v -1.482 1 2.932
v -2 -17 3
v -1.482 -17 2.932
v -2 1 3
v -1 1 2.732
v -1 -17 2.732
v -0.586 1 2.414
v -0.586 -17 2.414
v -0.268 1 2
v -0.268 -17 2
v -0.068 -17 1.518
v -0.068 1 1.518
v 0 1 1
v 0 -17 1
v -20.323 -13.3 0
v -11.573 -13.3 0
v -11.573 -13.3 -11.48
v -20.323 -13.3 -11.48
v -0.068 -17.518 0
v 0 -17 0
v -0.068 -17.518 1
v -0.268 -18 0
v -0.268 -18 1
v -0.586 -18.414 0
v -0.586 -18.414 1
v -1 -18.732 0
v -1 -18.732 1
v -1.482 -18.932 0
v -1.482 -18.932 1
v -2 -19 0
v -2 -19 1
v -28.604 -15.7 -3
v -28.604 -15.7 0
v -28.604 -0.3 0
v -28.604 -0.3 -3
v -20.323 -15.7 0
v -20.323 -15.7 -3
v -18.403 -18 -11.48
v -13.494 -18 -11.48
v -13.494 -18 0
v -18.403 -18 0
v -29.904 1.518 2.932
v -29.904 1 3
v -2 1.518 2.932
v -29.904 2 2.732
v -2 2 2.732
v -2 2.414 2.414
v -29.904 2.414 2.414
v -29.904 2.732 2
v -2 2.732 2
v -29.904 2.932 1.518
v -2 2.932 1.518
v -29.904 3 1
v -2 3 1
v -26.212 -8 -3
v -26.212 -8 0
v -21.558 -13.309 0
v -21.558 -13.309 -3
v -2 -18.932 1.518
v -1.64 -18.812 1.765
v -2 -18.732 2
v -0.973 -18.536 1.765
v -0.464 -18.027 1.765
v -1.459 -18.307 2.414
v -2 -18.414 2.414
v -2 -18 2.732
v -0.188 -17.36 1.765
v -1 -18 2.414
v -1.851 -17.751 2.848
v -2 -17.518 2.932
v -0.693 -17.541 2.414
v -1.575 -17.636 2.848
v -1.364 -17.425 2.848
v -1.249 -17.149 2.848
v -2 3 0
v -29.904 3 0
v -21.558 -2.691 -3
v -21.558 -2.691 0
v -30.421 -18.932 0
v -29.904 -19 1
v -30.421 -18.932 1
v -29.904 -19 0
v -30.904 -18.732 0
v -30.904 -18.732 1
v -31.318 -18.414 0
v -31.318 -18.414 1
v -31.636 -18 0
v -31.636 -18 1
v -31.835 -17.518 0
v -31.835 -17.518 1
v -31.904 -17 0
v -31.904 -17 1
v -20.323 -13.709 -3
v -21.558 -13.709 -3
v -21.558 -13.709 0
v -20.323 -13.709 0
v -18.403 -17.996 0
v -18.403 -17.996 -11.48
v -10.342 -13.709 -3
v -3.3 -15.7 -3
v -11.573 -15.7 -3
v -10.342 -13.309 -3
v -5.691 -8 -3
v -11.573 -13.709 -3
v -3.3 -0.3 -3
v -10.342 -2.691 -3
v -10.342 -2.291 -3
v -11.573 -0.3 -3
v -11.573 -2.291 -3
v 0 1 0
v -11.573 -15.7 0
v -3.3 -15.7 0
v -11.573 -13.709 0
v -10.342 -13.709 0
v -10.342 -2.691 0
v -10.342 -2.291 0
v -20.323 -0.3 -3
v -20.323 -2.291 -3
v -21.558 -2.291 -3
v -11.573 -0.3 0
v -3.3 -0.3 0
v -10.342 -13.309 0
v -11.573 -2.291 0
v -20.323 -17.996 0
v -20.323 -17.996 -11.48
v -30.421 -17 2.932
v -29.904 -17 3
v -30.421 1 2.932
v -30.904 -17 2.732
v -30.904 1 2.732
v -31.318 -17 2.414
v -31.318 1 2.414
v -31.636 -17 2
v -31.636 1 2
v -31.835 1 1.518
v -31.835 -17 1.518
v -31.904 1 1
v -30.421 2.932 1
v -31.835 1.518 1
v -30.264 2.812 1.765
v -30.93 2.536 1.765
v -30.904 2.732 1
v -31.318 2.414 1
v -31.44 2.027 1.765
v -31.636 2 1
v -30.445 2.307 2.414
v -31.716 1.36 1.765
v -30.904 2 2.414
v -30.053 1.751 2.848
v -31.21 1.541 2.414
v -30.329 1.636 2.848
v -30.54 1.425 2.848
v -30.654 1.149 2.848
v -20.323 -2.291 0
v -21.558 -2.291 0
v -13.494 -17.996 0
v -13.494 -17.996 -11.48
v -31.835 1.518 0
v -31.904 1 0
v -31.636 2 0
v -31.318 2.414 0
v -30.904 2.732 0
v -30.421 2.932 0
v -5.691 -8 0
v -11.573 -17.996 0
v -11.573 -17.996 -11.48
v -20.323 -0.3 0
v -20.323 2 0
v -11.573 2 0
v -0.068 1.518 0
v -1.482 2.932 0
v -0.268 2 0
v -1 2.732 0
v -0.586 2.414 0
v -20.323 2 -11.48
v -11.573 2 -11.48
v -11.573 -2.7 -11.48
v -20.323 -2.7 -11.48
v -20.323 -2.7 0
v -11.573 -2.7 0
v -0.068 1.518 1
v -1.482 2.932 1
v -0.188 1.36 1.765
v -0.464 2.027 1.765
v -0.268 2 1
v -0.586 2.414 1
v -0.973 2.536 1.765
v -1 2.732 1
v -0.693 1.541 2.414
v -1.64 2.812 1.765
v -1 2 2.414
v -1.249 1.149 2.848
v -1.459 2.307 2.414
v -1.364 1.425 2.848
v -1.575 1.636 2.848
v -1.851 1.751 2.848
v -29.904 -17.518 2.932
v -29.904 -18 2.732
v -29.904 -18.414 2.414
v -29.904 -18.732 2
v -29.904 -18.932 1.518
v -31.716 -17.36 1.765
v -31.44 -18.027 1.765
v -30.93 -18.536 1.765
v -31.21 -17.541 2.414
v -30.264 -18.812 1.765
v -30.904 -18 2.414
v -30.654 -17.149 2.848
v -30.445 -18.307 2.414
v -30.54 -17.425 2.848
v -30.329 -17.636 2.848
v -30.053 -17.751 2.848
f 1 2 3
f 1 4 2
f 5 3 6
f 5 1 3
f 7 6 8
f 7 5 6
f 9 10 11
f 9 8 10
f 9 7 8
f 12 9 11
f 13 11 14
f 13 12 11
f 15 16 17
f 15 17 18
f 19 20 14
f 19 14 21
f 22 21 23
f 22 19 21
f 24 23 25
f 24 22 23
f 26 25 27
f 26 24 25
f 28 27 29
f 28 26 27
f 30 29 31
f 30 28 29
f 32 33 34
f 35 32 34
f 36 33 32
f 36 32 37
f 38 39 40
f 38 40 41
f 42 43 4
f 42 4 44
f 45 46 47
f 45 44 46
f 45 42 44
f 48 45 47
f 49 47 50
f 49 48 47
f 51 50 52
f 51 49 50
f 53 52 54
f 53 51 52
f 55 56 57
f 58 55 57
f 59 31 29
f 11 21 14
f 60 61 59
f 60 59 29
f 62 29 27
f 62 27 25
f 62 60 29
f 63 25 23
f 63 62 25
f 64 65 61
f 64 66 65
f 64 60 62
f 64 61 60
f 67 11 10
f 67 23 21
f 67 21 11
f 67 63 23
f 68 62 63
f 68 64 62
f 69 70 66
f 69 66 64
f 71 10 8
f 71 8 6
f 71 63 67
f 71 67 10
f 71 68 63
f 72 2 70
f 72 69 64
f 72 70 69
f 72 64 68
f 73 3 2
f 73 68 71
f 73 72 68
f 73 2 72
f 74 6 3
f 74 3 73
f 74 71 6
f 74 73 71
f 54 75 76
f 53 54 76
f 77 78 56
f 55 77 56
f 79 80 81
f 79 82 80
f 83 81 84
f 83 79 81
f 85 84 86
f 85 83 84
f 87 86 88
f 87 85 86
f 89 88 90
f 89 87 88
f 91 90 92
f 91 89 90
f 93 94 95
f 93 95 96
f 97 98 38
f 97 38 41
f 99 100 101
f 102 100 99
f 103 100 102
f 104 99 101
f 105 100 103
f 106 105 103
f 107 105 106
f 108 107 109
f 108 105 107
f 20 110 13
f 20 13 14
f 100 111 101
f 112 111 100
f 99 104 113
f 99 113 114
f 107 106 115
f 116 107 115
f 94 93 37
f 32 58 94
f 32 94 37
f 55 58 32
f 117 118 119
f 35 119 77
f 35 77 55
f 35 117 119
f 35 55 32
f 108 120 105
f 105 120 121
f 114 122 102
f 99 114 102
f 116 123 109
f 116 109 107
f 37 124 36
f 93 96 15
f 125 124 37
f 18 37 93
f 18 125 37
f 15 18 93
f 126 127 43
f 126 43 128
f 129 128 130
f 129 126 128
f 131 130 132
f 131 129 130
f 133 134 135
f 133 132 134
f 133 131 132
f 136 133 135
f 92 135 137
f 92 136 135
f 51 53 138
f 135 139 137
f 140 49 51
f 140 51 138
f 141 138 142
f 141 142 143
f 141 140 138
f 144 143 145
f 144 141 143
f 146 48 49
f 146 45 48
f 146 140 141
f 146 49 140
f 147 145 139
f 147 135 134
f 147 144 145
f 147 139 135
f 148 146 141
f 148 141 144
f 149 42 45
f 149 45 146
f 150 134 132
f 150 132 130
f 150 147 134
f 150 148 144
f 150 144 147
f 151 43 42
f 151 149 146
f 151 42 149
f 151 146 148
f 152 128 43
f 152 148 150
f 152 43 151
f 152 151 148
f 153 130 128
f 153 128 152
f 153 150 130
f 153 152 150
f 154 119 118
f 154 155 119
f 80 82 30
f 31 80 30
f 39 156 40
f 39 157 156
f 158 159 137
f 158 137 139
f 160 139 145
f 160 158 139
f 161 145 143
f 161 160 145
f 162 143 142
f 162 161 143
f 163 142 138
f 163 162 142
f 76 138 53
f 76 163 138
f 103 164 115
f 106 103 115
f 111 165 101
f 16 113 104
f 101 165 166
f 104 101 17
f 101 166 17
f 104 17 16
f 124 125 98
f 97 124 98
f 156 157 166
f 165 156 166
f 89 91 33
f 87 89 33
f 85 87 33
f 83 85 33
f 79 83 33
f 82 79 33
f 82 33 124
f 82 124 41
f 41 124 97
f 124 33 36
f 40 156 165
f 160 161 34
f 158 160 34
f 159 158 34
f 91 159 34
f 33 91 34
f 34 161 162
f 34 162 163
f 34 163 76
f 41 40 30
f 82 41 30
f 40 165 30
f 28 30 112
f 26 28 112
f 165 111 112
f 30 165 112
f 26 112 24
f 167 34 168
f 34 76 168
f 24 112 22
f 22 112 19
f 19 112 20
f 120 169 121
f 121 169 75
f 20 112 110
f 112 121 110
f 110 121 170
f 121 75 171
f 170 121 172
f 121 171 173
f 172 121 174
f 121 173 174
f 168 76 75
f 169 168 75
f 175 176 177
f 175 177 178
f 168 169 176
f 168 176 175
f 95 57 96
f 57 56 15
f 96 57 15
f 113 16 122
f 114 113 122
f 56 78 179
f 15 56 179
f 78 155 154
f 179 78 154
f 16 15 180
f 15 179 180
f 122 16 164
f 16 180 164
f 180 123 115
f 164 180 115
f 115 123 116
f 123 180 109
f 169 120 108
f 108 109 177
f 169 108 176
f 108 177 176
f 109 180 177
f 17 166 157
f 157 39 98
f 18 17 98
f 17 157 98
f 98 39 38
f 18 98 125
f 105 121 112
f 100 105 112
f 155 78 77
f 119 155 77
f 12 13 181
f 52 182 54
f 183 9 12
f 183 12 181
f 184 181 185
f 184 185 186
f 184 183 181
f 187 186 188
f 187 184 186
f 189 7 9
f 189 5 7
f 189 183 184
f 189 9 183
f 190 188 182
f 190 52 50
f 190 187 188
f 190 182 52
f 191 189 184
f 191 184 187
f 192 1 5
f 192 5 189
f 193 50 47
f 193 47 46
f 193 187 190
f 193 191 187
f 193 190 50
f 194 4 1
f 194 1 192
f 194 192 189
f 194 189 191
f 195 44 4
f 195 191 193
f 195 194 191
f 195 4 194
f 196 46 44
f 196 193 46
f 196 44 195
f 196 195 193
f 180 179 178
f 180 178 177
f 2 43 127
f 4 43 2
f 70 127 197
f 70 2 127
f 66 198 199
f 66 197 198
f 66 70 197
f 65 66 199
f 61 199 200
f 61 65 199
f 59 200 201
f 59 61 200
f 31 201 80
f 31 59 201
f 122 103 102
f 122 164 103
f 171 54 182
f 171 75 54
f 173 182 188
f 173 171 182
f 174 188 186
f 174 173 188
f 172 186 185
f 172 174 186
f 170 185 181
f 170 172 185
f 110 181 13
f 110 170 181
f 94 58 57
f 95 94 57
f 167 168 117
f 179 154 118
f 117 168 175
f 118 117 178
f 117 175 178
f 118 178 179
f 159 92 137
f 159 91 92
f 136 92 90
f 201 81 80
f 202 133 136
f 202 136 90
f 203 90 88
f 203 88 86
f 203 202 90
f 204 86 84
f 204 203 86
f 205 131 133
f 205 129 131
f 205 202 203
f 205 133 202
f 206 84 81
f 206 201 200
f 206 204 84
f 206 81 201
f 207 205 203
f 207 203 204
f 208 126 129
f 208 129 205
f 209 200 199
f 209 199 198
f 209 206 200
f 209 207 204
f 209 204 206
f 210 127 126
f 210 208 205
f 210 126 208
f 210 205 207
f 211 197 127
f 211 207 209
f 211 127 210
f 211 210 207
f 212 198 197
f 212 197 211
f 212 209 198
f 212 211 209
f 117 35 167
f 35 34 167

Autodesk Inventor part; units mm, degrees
ref_plane "YZ Plane" through (0, 0, 0) normal (1, 0, 0) x (0, 1, 0)
ref_plane "XZ Plane" through (0, 0, 0) normal (0, 1, 0) x (-1, 0, 0)
sketch "Sketch1" plane through (0, 0, 0) normal (0, 0, 1) x (1, 0, 0)
  arc A0 (-31.9035, -17) -> (-29.9035, -19) centre (-29.9035, -17) ccw projected
  line L0 (-29.9035, -19) -> (-2, -19) projected
  arc A1 (-2, -19) -> (0, -17) centre (-2, -17) ccw projected
  line L1 (0, 1) -> (0, -17) projected
  arc A2 (0, 1) -> (-2, 3) centre (-2, 1) ccw projected
  line L2 (-2, 3) -> (-29.9035, 3) projected
  arc A3 (-29.9035, 3) -> (-31.9035, 1) centre (-29.9035, 1) ccw projected
  line L3 (-31.9035, -17) -> (-31.9035, 1) projected
  line L4 (-17.2029, -18.3) -> (-17.2029, -16) projected
  line L5 (-28.9035, -16) -> (-17.2029, -16) projected
  line L6 (-28.9035, 0) -> (-28.9035, -16) projected
  line L7 (-17.2029, 0) -> (-28.9035, 0) projected
  line L8 (-17.2029, 0) -> (-17.2029, 2.3) projected
  line L9 (-17.2029, 2.3) -> (-14.6938, 2.3) projected
  line L10 (-14.6938, 2.3) -> (-14.6938, 0) projected
  line L11 (-3, 0) -> (-14.6938, 0) projected
  line L12 (-3, 0) -> (-3, -16) projected
  line L13 (-14.6938, -16) -> (-3, -16) projected
  line L14 (-14.6938, -16) -> (-14.6938, -18.3) projected
  line L15 (-17.2029, -18.3) -> (-14.6938, -18.3) projected
  line L16 (-14.6938, -16) -> (-17.2029, -16)
  line L17 (-14.6938, 0) -> (-17.2029, 0)
  line L18 (-16.9029, -16) -> (-14.9938, -16)
  line L19 (-14.9938, -16) -> (-14.9938, -18)
  line L20 (-14.9938, -18) -> (-16.9029, -18)
  line L21 (-16.9029, -18) -> (-16.9029, -16)
  line L22 (-16.9029, 2) -> (-14.9938, 2)
  line L23 (-14.9938, 2) -> (-14.9938, 0)
  line L24 (-14.9938, 0) -> (-16.9029, 0)
  line L25 (-16.9029, 0) -> (-16.9029, 2)
  point P0 (0, 0)
  dimension "d5" = 0.3
  dimension "d6" = 0
  dimension "d7" = 0.3
  dimension "d8" = 0.3
  dimension "d9" = 0.3
  dimension "d10" = 0.3
  dimension "d11" = 0.3
  dimension "d12" = 0
extrude "Extrusion1" add sketch "Sketch1" against normal blind 14.9 contours L16 L19 L20 L21 | L25 L22 L23 L17
ref_plane "Work Plane1" through (0, 0, 0) normal (0, 0, 1) x (1, 0, 0)
sketch "Sketch2" plane through (0, 0, 0) normal (0, 0, 1) x (1, 0, 0)
  arc A0 (-31.9035, -17) -> (-29.9035, -19) centre (-29.9035, -17) ccw projected
  line L0 (-29.9035, -19) -> (-2, -19) projected
  arc A1 (-2, -19) -> (0, -17) centre (-2, -17) ccw projected
  line L1 (0, 1) -> (0, -17) projected
  arc A2 (0, 1) -> (-2, 3) centre (-2, 1) ccw projected
  line L2 (-2, 3) -> (-29.9035, 3) projected
  arc A3 (-29.9035, 3) -> (-31.9035, 1) centre (-29.9035, 1) ccw projected
  line L3 (-31.9035, -17) -> (-31.9035, 1) projected
  line L4 (-17.2029, -18.3) -> (-17.2029, -16) projected
  line L5 (-28.9035, -16) -> (-17.2029, -16) projected
  line L6 (-28.9035, 0) -> (-28.9035, -16) projected
  line L7 (-17.2029, 0) -> (-28.9035, 0) projected
  line L8 (-17.2029, 0) -> (-17.2029, 2.3) projected
  line L9 (-17.2029, 2.3) -> (-14.6938, 2.3) projected
  line L10 (-14.6938, 2.3) -> (-14.6938, 0) projected
  line L11 (-3, 0) -> (-14.6938, 0) projected
  line L12 (-3, 0) -> (-3, -16) projected
  line L13 (-14.6938, -16) -> (-3, -16) projected
  line L14 (-14.6938, -16) -> (-14.6938, -18.3) projected
  line L15 (-17.2029, -18.3) -> (-14.6938, -18.3) projected
  line L16 (-17.2029, 0) -> (-14.6938, 0) projected
  line L17 (-14.6938, 0) -> (-14.6938, 2.3) projected
  line L18 (-14.6938, 2.3) -> (-17.2029, 2.3) projected
  line L19 (-17.2029, 2.3) -> (-17.2029, 0) projected
  line L20 (-17.2029, -18.3) -> (-14.6938, -18.3) projected
  line L21 (-14.6938, -18.3) -> (-14.6938, -16) projected
  line L22 (-14.6938, -16) -> (-17.2029, -16) projected
  line L23 (-17.2029, -16) -> (-17.2029, -18.3) projected
  point P0 (0, 0)
extrude "Extrusion2" add sketch "Sketch2" along normal blind 3 contours L3 A3 L2 A2 L1 A1 L0 A0 | L4 L22 L14 L15 | L5 L6 L7 L16 L11 L12 L13 L22 | L8 L9 L10 L16
fillet "Fillet1" radius 2 8 edges at (-31.3177, -18.4142, 3) (-31.9035, -8, 3) (-31.3177, 2.4142, 3) (-15.9518, 3, 3) (-0.5858, 2.4142, 3) (0, -8, 3) (-0.5858, -18.4142, 3) (-15.9518, -19, 3)
sketch "Sketch3" plane through (0, 0, 0) normal (0, 0, -1) x (-1, 0, 0)
  arc A0 (29.9035, -19) -> (31.9035, -17) centre (29.9035, -17) ccw projected
  line L0 (29.9035, -19) -> (2, -19) projected
  arc A1 (0, -17) -> (2, -19) centre (2, -17) ccw projected
  line L1 (0, 1) -> (0, -17) projected
  arc A2 (2, 3) -> (0, 1) centre (2, 1) ccw projected
  line L2 (2, 3) -> (29.9035, 3) projected
  arc A3 (31.9035, 1) -> (29.9035, 3) centre (29.9035, 1) ccw projected
  line L3 (31.9035, -17) -> (31.9035, 1) projected
  line L4 (17.2029, -18.3) -> (17.2029, -16) projected
  line L5 (28.9035, -16) -> (17.2029, -16) projected
  line L6 (28.9035, 0) -> (28.9035, -16) projected
  line L7 (17.2029, 0) -> (28.9035, 0) projected
  line L8 (17.2029, 0) -> (17.2029, 2.3) projected
  line L9 (17.2029, 2.3) -> (14.6938, 2.3) projected
  line L10 (14.6938, 2.3) -> (14.6938, 0) projected
  line L11 (3, 0) -> (14.6938, 0) projected
  line L12 (3, 0) -> (3, -16) projected
  line L13 (14.6938, -16) -> (3, -16) projected
  line L14 (14.6938, -16) -> (14.6938, -18.3) projected
  line L15 (17.2029, -18.3) -> (14.6938, -18.3) projected
  line L16 (14.9938, 0) -> (16.9029, 0) projected
  line L17 (14.9938, 0) -> (14.9938, -0.3)
  line L18 (14.9938, -0.3) -> (3.3, -0.3)
  line L19 (3.3, -0.3) -> (3.3, -1.8)
  line L20 (3.3, -1.8) -> (28.6035, -1.8)
  line L21 (28.6035, -0.3) -> (16.9029, -0.3)
  line L22 (16.9029, 0) -> (16.9029, -0.3)
  line L23 (28.6035, -1.8) -> (28.6035, -0.3)
  line L24 (3, -8) -> (28.9035, -8) construction
  line L25 (14.9938, -16) -> (16.9029, -16)
  line L26 (14.9938, -16) -> (14.9938, -15.7)
  line L27 (14.9938, -15.7) -> (3.3, -15.7)
  line L28 (3.3, -15.7) -> (3.3, -14.2)
  line L29 (3.3, -14.2) -> (28.6035, -14.2)
  line L30 (28.6035, -15.7) -> (16.9029, -15.7)
  line L31 (16.9029, -16) -> (16.9029, -15.7)
  line L32 (28.6035, -14.2) -> (28.6035, -15.7)
  line L33 (3.3, -1.8) -> (3.3, -14.2)
  line L34 (4.8, -14.2) -> (4.8, -1.8)
  line L35 (28.6035, -1.8) -> (28.6035, -14.2)
  line L36 (27.1035, -14.2) -> (27.1035, -1.8)
  point P0 (0, 0)
  dimension "d13" = 0.3
  dimension "d14" = 0.3
  dimension "d15" = 1.5
  dimension "d16" = 0.3
  dimension "d17" = 0.3
  dimension "d20" = 1.5
  dimension "d21" = 1.5
extrude "Extrusion3" add sketch "Sketch3" along normal blind 3 contours L16 L22 L21 L23 L20 L19 L18 L17 | L20 L34 L29 L33 | L35 L29 L36 L20 | L29 L32 L30 L31 L25 L26 L27 L28
sketch "Sketch4" plane through (-14.9938, -18, -14.9) normal (1, 0, 0) x (0, 0, -1)
  line L0 (-14.9, -0.3) -> (2.2893, -0.3) projected
  line L1 (-14.9, 2) -> (-14.9, -0.3) projected
  line L2 (2.2893, 2) -> (-14.9, 2) projected
  line L3 (2.2893, 2) -> (2.2893, -0.3) projected
  line L4 (0, 2) -> (0, 0) projected
  line L5 (-14.9, 0) -> (0, 0) projected
  line L6 (-14.9, 2.3) -> (-14.9, 0) projected
  line L7 (-14.9, 2.3) -> (-11.9, 2.3) projected
  line L8 (-11.9, 2.3) -> (-11.9, 2) projected
  line L9 (-11.9, 2) -> (0, 2) projected
  line L10 (0, 18) -> (0, 20) projected
  line L11 (-14.9, 20) -> (0, 20) projected
  line L12 (-14.9, 20) -> (-14.9, 17.7) projected
  line L13 (-14.9, 17.7) -> (-11.9, 17.7) projected
  line L14 (-11.9, 17.7) -> (-11.9, 18) projected
  line L15 (-11.9, 18) -> (0, 18) projected
  line L16 (-7.45, 2) -> (-11.9, 4.6913)
  line L17 (-11.9, 4.6913) -> (-11.9, 2.3)
  line L18 (-11.9, 10) -> (3.9744, 10) construction
  line L19 (-7.45, 18) -> (-11.9, 15.3087)
  line L20 (-11.9, 15.3087) -> (-11.9, 17.7)
  point P0 (-14.9, 18)
extrude "Extrusion4" add sketch "Sketch4" against normal up to surface (1.9092 mm away) contours L8 L17 L16 L2 | L19 L20 L14 L15
sketch "Sketch6" plane through (0, 0, 0) normal (0, 0, -1) x (-1, 0, 0)
  line L0 (27.1035, -1.8) -> (4.8, -1.8) projected
  line L1 (4.8, -1.8) -> (4.8, -14.2) projected
  line L2 (4.8, -14.2) -> (27.1035, -14.2) projected
  line L3 (27.1035, -14.2) -> (27.1035, -1.8) projected
  line L4 (14.9938, -13.3087) -> (16.9029, -13.3087) projected
  line L5 (14.9938, -2.6913) -> (16.9029, -2.6913) projected
  line L6 (14.9938, -2.6913) -> (5.6913, -2.6913)
  line L7 (5.6913, -2.6913) -> (5.6913, -13.3087)
  line L8 (5.6913, -13.3087) -> (14.9938, -13.3087)
  line L9 (16.9029, -13.3087) -> (26.2122, -13.3087)
  line L10 (26.2122, -13.3087) -> (26.2122, -2.6913)
  line L11 (26.2122, -2.6913) -> (16.9029, -2.6913)
  point P0 (0, 0)
  dimension "d24" = 0.8913
  dimension "d25" = 0.8913
  dimension "d26" = 0.8913
extrude "Extrusion5" add sketch "Sketch6" along normal up to surface (3 mm away)
sketch "Sketch7" plane through (0, 0, 0) normal (0, 0, -1) x (-1, 0, 0)
  line L0 (14.9938, -2.6913) -> (14.9938, -0.3) projected
  line L1 (3.3, -0.3) -> (14.9938, -0.3) projected
  line L2 (3.3, -15.7) -> (3.3, -0.3) projected
  line L3 (14.9938, -15.7) -> (3.3, -15.7) projected
  line L4 (14.9938, -13.3087) -> (14.9938, -15.7) projected
  line L5 (5.6913, -13.3087) -> (14.9938, -13.3087) projected
  line L6 (5.6913, -2.6913) -> (5.6913, -13.3087) projected
  line L7 (14.9938, -2.6913) -> (5.6913, -2.6913) projected
  line L8 (16.9029, -0.3) -> (16.9029, -2.6913) projected
  line L9 (26.2122, -2.6913) -> (16.9029, -2.6913) projected
  line L10 (26.2122, -13.3087) -> (26.2122, -2.6913) projected
  line L11 (16.9029, -13.3087) -> (26.2122, -13.3087) projected
  line L12 (16.9029, -13.3087) -> (16.9029, -15.7) projected
  line L13 (28.6035, -15.7) -> (16.9029, -15.7) projected
  line L14 (28.6035, -0.3) -> (28.6035, -15.7) projected
  line L15 (16.9029, -0.3) -> (28.6035, -0.3) projected
  line L16 (5.6913, -8) -> (10.3425, -13.3087)
  line L17 (5.6913, -8) -> (10.3425, -2.6913)
  line L18 (21.5576, -2.6913) -> (26.2122, -8)
  line L19 (26.2122, -8) -> (21.5576, -13.3087)
  point P0 (0, 0)
extrude "Extrusion6" add sketch "Sketch7" along normal up to surface (3 mm away) contours L17 L6 L7 | L16 L5 L6 | L9 L10 L18 | L10 L11 L19
sketch "Sketch8" plane through (0, 0, -14.9) normal (0, 0, -1) x (-1, 0, 0)
  line L0 (16.9029, 2) -> (16.9029, 0) projected
  line L1 (14.9938, 0) -> (14.9938, 2) projected
  line L2 (16.9029, 0) -> (14.9938, 0) projected
  line L3 (13.4938, 2) -> (18.4028, 2)
  line L4 (18.4028, 2) -> (18.4028, 0)
  line L5 (18.4028, 0) -> (13.4938, 0)
  line L6 (13.4938, 0) -> (13.4938, 2)
  line L7 (3.3, -15.7) -> (3.3, -0.3) projected
  line L8 (28.6035, -0.3) -> (28.6035, -15.7) projected
  line L9 (3.3, -8) -> (28.6035, -8) construction
  line L10 (13.4938, -18) -> (18.4028, -18)
  line L11 (18.4028, -18) -> (18.4028, -16)
  line L12 (18.4028, -16) -> (13.4938, -16)
  line L13 (13.4938, -16) -> (13.4938, -18)
  point P0 (0, 0)
  dimension "d31" = 4.909
  dimension "d32" = 1.9092
  dimension "d33" = 1.4999
  dimension "d34" = 0
  dimension "d35" = 2
  dimension "d36" = 2
extrude "Extrusion7" add sketch "Sketch8" against normal up to surface (14.9 mm away)
sketch "Sketch9" plane through (-14.9938, -16, 0) normal (1, 0, 0) x (0, 0, -1)
  line L0 (0, 0) -> (7.45, 0) projected
  line L1 (7.45, 0) -> (3, 2.6913) projected
  line L2 (3, 2.6913) -> (3, 0.3) projected
  line L3 (0, 0.3) -> (3, 0.3) projected
  line L4 (0, 0) -> (0, 0.3) projected
  line L5 (7.45, 16) -> (0, 16) projected
  line L6 (0, 16) -> (0, 15.7) projected
  line L7 (0, 15.7) -> (3, 15.7) projected
  line L8 (3, 13.3087) -> (3, 15.7) projected
  line L9 (3, 13.3087) -> (7.45, 16) projected
  point P0 (0, 16)
extrude "Extrusion8" add sketch "Sketch9" along normal up to surface (1.4999 mm away)
sketch "Sketch10" plane through (-16.9029, -16, 0) normal (-1, 0, 0) x (0, 0, 1)
  line L0 (-7.45, 0) -> (0, 0) projected
  line L1 (0, 0.3) -> (0, 0) projected
  line L2 (0, 0.3) -> (-3, 0.3) projected
  line L3 (-3, 2.6913) -> (-3, 0.3) projected
  line L4 (-7.45, 0) -> (-3, 2.6913) projected
  line L5 (0, 16) -> (-7.45, 16) projected
  line L6 (-3, 13.3087) -> (-7.45, 16) projected
  line L7 (-3, 15.7) -> (-3, 13.3087) projected
  line L8 (0, 15.7) -> (-3, 15.7) projected
  line L9 (0, 16) -> (0, 15.7) projected
  point P0 (0, 16)
extrude "Extrusion9" add sketch "Sketch10" along normal up to surface (1.4999 mm away)
sketch "Sketch11" plane through (-21.5576, -2.6913, 0) normal (0, -1, 0) x (1, 0, 0)
  line L0 (11.2151, -3) -> (11.2151, 0) projected
  line L1 (0, 0) -> (11.2151, 0) projected
  line L2 (0, 0) -> (0, -3) projected
  line L3 (0, -3) -> (3.1547, -3) projected
  line L4 (3.1547, -3) -> (8.0637, -3) projected
  line L5 (8.0637, -3) -> (11.2151, -3) projected
  line L6 (8.0637, -7.45) -> (3.1547, -7.45) projected
  line L7 (3.1547, -3) -> (3.1547, -7.45) projected
  line L8 (8.0637, -7.45) -> (8.0637, -3) projected
  point P0 (21.5576, 0)
extrude "Extrusion10" cut sketch "Sketch11" against normal blind 0.4
sketch "Sketch12" plane through (-21.5576, -13.3087, 0) normal (0, 1, 0) x (1, 0, 0)
  line L0 (11.2151, 0) -> (11.2151, 3) projected
  line L1 (11.2151, 3) -> (8.0637, 3) projected
  line L2 (8.0637, 3) -> (3.1547, 3) projected
  line L3 (3.1547, 3) -> (0, 3) projected
  line L4 (0, 3) -> (0, 0) projected
  line L5 (11.2151, 0) -> (0, 0) projected
  line L6 (8.0637, 3.6614) -> (3.1547, 3.6614) projected
  line L7 (3.1547, 3.6614) -> (3.1547, 3) projected
  line L8 (8.0637, 3.6614) -> (8.0637, 3)
  point P0 (21.5576, 0)
extrude "Extrusion11" cut sketch "Sketch12" against normal blind 0.4
sketch "Sketch13" plane through (-18.4028, 0, -7.45) normal (0, -1, 0) x (1, 0, 0)
  line L0 (4.909, 0) -> (0, 0) projected
  line L1 (0, -7.45) -> (0, 0) projected
  line L2 (0, -7.45) -> (4.909, -7.45) projected
  line L3 (4.909, -7.45) -> (4.909, 0) projected
  point P0 (18.4028, 7.45)
ref_plane "Work Plane2" through (-20.3233, -0.3, -20.2296) normal (0, 1, 0) x (0, 0, 1)
extrude "Extrusion12" add sketch "Sketch13" along normal up to surface (0.3 mm away)
sketch "Sketch14" plane through (-18.4028, 2, -14.9) normal (0, 1, 0) x (1, 0, 0)
  line L0 (4.909, 0) -> (0, 0) projected
  line L1 (0, 0) -> (0, -14.9) projected
  line L2 (6.8295, -3.4204) -> (-1.9205, -3.4204)
  line L3 (0, -3.4204) -> (4.909, -3.4204)
  line L4 (4.909, -3.4204) -> (4.909, 0)
  line L5 (4.909, 0) -> (0, 0)
  line L6 (0, 0) -> (0, -3.4204)
  point P0 (18.4028, -14.9)
extrude "Extrusion13" cut sketch "Sketch14" against normal up to surface (20 mm away)
ref_plane "Work Plane3" through (-20.3233, -0.3, -11.4796) normal (0, 0, 1) x (-1, 0, 0)
sketch "Sketch15" plane through (-20.3233, -0.3, -11.4796) normal (0, 0, 1) x (-1, 0, 0)
  line L0 (-8.75, 17.6961) -> (-8.75, 13)
  line L1 (0, 17.6961) -> (-8.75, 17.6961)
  line L2 (-8.75, 13) -> (0, 13)
  line L3 (0, 17.6961) -> (0, 13)
  line L4 (-8.75, 2.4) -> (-8.75, -2.3)
  line L5 (0, 2.4) -> (-8.75, 2.4)
  line L6 (-8.75, -2.3) -> (0, -2.3)
  line L7 (0, -2.3) -> (0, 2.4)
  point P0 (-20.3233, -0.3)
extrude "Extrusion14" add sketch "Sketch15" along normal up to surface (11.4796 mm away)
equation "\"d7\" = d5"
equation "\"d8\" = d5"
equation "\"d9\" = d5"
equation "\"d10\" = d9"
equation "\"d11\" = d10"
equation "\"d20\" = d15"
equation "\"d21\" = d20"
equation "\"d25\" = d24"
equation "\"d26\" = d24"
equation "\"d33\" = -0.5 * d32 + 0.5 * d31"
equation "\"d35\" = d36"
properties part number "GearBoxTop"
